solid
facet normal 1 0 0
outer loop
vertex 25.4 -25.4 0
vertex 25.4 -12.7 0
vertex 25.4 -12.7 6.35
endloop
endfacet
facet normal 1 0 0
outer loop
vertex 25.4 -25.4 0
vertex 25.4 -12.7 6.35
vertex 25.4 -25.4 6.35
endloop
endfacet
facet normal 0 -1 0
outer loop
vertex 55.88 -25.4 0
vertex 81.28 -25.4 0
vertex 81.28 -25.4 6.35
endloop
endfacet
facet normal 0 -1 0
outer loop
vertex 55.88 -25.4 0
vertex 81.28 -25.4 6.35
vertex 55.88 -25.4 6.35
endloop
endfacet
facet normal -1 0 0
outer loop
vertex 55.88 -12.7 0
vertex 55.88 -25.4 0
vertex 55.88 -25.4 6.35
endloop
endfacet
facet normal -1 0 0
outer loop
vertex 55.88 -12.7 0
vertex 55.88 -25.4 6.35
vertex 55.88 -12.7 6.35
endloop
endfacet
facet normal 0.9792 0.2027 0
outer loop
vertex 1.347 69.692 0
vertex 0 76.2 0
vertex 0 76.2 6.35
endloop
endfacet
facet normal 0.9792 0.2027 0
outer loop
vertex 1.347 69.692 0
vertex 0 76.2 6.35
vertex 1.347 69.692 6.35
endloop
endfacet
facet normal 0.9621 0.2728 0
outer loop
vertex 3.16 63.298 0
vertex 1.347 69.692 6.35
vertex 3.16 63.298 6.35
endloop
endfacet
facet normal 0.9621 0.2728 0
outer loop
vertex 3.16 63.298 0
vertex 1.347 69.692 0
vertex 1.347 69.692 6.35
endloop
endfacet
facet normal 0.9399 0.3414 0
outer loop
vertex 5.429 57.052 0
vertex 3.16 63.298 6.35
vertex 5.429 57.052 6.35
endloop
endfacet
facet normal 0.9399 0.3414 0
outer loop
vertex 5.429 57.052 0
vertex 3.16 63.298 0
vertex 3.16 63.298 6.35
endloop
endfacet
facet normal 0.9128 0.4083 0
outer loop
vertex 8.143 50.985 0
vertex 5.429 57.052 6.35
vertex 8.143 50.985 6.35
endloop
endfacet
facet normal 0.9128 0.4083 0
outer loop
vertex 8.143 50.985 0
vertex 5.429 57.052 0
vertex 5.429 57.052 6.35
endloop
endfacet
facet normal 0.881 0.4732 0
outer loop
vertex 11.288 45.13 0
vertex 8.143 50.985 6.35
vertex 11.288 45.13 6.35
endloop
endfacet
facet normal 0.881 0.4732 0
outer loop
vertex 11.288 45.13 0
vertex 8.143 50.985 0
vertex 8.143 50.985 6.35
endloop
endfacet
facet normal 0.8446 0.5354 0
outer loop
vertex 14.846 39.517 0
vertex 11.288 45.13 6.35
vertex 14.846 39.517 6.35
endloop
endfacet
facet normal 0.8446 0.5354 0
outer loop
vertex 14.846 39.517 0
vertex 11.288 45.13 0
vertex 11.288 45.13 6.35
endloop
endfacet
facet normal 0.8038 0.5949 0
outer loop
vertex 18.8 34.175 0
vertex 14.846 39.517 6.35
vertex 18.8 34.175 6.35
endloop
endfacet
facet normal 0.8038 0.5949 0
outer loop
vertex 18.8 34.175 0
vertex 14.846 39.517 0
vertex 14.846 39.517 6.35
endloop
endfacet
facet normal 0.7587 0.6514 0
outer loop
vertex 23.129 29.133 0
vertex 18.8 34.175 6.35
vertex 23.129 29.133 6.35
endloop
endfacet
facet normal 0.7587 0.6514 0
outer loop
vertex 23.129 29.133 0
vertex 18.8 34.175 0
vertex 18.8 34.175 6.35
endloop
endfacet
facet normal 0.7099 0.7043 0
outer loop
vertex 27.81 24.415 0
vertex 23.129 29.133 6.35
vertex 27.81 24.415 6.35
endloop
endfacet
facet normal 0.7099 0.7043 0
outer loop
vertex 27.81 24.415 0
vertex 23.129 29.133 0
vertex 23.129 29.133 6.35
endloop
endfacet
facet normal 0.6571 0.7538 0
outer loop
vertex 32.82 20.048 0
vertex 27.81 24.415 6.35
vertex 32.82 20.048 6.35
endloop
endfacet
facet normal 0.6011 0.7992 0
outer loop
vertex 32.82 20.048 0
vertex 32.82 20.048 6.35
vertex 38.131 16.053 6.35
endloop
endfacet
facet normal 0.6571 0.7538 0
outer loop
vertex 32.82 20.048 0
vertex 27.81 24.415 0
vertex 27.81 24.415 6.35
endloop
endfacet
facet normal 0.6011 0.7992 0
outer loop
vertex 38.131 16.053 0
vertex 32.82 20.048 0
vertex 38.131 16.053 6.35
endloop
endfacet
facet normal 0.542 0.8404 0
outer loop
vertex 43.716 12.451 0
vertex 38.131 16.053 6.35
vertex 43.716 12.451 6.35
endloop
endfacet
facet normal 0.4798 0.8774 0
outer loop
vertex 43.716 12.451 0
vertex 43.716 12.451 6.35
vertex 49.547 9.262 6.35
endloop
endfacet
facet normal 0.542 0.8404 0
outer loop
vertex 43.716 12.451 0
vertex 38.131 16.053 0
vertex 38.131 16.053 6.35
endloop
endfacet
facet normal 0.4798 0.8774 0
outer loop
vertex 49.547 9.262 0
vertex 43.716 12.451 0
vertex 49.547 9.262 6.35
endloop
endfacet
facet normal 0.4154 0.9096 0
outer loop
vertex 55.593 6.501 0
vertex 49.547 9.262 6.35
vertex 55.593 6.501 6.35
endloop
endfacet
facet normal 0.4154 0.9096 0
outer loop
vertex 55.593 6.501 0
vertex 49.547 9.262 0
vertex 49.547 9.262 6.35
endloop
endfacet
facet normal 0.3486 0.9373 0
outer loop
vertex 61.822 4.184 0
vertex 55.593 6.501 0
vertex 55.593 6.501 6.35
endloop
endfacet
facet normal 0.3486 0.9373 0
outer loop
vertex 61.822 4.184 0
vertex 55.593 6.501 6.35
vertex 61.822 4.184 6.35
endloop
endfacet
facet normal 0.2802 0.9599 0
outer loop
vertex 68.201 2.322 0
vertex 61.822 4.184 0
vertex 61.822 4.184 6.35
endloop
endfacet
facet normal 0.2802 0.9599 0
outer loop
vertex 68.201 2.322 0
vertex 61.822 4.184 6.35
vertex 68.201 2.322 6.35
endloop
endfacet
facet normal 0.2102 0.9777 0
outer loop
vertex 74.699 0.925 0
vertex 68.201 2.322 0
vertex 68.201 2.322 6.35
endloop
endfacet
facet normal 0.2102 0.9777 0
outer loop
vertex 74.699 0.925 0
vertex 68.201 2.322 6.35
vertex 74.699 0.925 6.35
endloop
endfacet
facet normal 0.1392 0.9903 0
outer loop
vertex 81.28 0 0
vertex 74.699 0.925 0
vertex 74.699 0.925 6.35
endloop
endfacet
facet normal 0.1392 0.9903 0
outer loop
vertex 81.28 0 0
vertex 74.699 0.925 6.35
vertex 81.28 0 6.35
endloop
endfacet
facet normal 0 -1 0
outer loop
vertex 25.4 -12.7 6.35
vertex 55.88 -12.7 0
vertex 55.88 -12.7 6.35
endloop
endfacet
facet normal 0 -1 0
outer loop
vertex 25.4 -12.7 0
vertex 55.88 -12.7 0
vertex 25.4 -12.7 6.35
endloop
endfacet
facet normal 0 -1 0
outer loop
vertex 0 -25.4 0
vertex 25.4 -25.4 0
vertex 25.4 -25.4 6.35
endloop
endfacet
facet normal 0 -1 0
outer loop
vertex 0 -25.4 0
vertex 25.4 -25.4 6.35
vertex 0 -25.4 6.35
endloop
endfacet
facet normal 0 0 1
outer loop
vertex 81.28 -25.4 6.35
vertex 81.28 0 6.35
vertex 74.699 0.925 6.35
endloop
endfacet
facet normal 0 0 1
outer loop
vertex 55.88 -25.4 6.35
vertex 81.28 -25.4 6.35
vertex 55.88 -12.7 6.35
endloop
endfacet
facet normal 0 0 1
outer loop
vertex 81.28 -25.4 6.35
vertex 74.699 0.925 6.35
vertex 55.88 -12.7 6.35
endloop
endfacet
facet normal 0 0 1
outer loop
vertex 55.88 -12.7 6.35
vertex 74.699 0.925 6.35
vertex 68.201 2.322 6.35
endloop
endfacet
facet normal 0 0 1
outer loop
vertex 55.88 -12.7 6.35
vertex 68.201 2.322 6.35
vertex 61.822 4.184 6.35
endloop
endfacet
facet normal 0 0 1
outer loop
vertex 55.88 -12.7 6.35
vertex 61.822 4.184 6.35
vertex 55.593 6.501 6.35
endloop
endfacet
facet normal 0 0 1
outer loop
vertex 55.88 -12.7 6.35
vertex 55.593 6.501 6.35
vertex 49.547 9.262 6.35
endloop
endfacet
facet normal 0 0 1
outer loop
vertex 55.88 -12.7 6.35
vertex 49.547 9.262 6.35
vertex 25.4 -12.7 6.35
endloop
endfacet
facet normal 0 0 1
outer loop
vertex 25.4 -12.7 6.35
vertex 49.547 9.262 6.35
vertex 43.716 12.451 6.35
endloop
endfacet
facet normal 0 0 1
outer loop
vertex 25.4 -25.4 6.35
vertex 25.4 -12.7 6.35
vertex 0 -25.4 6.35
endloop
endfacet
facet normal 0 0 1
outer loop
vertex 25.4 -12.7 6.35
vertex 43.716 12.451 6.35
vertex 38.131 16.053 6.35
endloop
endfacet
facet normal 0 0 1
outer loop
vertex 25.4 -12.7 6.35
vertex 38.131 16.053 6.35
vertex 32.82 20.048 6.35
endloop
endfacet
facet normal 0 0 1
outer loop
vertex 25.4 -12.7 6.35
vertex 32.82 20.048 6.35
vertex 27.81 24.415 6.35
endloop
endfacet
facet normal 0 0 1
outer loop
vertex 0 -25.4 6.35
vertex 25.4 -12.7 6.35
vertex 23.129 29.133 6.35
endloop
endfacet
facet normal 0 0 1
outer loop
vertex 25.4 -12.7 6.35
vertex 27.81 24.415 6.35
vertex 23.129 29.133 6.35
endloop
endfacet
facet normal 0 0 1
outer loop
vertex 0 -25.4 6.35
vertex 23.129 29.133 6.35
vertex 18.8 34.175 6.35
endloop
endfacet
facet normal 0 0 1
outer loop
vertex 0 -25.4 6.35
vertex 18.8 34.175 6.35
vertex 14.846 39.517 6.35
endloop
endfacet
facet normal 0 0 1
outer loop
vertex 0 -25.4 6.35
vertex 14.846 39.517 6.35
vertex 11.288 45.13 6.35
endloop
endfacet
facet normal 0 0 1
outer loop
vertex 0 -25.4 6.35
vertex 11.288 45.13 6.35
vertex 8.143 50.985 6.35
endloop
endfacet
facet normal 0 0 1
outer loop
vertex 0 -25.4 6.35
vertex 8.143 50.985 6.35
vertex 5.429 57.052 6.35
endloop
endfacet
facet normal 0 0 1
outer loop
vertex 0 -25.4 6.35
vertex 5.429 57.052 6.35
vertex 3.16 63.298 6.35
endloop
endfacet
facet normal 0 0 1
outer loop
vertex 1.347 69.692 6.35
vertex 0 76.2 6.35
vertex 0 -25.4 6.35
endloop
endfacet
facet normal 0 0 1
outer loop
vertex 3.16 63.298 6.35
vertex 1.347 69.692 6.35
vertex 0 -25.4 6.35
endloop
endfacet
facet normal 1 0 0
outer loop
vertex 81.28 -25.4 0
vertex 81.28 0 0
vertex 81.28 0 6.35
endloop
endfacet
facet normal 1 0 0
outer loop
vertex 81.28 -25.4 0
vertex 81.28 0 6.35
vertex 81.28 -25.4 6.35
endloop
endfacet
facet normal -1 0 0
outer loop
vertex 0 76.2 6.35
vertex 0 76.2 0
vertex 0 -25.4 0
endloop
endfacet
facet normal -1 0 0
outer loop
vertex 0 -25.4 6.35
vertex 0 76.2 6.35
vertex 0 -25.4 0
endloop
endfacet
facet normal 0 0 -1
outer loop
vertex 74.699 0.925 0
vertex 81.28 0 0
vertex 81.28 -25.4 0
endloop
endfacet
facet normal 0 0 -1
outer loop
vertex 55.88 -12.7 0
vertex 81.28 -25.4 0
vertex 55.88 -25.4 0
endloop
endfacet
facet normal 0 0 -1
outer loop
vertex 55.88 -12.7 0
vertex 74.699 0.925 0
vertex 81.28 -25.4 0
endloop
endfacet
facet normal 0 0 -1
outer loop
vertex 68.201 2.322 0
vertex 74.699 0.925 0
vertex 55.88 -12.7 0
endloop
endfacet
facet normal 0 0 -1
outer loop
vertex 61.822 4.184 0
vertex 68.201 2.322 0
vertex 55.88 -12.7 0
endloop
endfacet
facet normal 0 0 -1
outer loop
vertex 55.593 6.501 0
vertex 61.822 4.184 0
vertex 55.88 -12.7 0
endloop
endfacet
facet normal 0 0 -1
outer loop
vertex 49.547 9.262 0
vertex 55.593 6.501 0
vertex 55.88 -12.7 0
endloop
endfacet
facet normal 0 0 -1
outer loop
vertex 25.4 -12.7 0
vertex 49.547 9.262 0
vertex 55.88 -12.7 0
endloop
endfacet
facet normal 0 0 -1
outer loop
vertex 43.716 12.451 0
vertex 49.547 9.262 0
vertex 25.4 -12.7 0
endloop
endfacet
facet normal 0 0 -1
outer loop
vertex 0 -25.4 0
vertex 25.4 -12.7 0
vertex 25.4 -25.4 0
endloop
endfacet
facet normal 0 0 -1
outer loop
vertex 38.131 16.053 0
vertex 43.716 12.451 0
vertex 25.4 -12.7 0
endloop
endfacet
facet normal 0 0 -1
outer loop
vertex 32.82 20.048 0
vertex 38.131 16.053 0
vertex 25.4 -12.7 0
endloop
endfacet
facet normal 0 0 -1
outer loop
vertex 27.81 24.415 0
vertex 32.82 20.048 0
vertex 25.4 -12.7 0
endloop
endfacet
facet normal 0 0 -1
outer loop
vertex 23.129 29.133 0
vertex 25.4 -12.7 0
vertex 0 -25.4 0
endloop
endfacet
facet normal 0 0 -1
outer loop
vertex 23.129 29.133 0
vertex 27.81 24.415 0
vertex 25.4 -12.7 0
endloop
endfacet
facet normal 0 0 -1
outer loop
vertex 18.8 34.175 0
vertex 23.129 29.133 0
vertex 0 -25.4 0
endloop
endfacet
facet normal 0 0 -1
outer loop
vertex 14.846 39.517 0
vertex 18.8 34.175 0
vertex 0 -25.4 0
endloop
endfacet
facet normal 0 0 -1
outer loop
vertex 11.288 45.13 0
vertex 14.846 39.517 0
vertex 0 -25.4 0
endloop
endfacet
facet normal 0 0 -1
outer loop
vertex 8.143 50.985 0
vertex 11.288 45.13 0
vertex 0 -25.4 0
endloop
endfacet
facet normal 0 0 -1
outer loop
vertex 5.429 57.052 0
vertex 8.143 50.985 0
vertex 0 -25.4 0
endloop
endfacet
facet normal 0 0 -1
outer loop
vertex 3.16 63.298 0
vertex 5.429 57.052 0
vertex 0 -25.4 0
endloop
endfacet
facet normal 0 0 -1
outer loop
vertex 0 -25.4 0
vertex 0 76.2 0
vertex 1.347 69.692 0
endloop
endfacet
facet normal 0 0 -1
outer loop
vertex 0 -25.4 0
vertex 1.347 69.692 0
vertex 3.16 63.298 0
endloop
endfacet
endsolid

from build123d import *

# Parameters (mm, degrees)
BOSS_EXTRUDE1_DEPTH = 6.35


with BuildPart() as part:
    # Sketch1 → Boss-Extrude1 (new body)
    with BuildSketch(Plane.XY):
        with BuildLine():
            ThreePointArc((0, 76.2), (27.810396475, 24.415089573), (81.28, 0))
            Line((81.28, 0), (0, 0))
            Line((0, 0), (0, 76.2))
        make_face()
        Polygon((0, -25.4), (0, 0), (81.28, 0), (81.28, -25.4), (55.88, -25.4), (55.88, -12.7), (25.4, -12.7), (25.4, -25.4), align=None)
    extrude(amount=BOSS_EXTRUDE1_DEPTH)


solid = part.part
